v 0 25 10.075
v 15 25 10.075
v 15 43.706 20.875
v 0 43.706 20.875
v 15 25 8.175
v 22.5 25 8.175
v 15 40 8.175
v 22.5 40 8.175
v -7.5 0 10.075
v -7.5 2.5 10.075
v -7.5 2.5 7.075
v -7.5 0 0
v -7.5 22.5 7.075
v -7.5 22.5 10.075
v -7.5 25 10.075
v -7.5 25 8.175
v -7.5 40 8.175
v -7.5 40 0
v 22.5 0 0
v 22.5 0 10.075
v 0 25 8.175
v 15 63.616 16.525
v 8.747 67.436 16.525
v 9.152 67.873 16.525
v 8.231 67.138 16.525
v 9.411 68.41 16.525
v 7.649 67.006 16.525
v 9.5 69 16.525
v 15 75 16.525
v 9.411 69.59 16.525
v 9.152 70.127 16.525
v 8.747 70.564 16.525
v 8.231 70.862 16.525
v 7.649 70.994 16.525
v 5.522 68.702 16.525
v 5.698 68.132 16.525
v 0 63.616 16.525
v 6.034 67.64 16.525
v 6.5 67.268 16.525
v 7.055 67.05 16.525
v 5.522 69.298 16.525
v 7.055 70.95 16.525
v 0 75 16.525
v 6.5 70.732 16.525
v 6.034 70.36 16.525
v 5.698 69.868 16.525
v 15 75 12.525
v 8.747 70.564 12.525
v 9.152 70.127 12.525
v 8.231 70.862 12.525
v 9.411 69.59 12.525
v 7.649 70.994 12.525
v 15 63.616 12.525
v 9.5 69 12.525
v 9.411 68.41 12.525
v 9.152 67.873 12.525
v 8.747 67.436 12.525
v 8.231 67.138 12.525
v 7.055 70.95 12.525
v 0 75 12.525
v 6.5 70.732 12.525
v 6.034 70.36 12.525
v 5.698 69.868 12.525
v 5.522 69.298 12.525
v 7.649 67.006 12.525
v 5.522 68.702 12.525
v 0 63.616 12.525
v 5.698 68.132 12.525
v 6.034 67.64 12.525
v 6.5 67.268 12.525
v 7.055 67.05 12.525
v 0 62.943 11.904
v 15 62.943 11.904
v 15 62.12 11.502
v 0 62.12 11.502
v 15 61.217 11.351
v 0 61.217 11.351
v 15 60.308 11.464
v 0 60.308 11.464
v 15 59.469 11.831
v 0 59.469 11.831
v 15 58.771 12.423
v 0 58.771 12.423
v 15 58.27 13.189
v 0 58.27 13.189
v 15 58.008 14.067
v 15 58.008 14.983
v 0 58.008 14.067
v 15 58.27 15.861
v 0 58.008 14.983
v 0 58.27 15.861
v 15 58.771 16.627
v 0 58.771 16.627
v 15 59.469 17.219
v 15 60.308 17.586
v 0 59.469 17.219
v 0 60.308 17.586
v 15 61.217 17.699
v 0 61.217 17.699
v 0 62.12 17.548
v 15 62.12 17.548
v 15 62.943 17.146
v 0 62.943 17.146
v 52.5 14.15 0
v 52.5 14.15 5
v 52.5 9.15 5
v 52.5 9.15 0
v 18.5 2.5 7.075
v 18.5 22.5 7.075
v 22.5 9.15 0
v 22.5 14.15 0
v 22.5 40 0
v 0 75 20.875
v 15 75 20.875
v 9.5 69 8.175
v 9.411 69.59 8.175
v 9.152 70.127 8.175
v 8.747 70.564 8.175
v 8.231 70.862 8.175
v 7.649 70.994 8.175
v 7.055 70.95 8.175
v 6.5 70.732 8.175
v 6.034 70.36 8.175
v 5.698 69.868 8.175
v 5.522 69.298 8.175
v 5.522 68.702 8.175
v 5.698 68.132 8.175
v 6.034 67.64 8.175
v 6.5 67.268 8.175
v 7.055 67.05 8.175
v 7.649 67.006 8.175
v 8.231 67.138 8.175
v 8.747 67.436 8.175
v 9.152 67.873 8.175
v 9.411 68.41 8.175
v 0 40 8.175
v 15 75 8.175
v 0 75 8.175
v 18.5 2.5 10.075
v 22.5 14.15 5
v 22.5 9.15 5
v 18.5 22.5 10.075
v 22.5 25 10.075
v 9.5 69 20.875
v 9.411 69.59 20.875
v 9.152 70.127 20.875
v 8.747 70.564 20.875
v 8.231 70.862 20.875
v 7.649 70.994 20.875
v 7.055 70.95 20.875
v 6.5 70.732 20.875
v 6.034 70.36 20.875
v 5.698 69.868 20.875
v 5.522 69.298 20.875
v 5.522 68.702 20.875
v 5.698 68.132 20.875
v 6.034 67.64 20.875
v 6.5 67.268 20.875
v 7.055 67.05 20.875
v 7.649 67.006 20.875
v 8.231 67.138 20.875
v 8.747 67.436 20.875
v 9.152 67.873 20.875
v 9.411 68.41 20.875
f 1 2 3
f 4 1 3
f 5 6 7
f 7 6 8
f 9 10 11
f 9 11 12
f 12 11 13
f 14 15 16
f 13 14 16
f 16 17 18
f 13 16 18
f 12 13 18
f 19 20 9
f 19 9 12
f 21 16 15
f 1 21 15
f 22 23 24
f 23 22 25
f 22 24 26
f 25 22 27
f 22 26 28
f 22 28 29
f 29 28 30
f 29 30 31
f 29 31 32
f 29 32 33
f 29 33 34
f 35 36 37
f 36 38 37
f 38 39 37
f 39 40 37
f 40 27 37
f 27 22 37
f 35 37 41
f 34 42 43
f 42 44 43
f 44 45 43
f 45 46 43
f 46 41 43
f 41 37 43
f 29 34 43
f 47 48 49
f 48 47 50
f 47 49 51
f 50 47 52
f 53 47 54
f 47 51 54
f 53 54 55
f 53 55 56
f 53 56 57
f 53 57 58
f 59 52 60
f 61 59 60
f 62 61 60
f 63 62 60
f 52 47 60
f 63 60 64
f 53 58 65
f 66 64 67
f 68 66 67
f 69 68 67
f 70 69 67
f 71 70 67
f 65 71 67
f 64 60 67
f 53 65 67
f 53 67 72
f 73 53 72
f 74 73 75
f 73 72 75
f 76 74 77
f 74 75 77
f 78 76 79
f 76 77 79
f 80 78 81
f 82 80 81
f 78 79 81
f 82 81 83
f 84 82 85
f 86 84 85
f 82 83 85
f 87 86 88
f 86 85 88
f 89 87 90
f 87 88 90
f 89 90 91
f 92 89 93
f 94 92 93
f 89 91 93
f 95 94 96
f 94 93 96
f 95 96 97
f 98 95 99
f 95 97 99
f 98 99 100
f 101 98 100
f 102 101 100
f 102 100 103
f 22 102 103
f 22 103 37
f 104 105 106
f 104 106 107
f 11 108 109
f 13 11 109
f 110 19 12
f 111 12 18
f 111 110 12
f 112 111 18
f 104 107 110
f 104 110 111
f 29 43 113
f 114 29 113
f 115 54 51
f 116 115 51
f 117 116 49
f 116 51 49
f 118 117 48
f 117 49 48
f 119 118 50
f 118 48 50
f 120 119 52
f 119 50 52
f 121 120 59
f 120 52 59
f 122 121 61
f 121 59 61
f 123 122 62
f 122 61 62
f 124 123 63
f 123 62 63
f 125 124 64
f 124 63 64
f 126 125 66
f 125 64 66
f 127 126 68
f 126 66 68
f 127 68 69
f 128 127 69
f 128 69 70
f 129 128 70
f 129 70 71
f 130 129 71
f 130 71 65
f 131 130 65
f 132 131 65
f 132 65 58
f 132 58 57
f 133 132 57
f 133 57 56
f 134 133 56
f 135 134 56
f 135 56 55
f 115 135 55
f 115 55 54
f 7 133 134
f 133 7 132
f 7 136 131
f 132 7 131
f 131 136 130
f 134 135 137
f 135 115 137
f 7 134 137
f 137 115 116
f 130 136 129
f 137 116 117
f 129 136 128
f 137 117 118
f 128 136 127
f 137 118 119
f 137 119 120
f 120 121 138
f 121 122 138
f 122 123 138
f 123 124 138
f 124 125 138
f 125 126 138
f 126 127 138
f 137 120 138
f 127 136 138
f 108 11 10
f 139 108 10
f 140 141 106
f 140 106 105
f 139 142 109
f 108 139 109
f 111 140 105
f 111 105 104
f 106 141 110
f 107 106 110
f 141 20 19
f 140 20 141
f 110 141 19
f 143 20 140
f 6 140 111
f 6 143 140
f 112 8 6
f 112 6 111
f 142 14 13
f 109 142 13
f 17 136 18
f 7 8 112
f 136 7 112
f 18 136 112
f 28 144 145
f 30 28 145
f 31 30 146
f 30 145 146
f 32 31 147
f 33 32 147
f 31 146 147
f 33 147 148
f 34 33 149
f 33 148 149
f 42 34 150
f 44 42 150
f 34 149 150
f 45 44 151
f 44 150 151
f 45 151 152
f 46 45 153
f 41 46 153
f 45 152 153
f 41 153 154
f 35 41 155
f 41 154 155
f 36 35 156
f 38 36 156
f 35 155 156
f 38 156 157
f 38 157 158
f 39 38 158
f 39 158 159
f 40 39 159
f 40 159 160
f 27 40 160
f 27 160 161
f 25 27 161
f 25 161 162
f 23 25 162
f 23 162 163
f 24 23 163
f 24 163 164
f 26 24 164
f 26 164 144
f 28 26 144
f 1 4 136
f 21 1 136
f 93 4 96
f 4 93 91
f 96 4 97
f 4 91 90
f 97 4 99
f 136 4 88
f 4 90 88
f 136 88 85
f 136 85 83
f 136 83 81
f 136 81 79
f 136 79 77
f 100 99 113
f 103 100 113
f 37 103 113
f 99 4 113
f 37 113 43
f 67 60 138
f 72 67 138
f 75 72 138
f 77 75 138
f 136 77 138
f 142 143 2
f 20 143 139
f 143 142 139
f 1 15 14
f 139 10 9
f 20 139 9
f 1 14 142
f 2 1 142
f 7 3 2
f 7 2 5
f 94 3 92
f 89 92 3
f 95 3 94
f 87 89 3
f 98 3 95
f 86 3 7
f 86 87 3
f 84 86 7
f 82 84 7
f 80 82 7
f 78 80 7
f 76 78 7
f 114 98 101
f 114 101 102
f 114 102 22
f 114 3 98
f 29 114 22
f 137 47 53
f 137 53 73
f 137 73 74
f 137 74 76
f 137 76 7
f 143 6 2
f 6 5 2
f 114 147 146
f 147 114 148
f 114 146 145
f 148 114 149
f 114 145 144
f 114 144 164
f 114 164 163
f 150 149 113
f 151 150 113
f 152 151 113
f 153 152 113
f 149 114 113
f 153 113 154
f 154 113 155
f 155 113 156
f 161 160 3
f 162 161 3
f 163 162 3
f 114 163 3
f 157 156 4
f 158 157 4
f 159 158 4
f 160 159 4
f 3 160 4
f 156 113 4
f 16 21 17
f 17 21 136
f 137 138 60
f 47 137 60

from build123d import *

# Parameters (mm, degrees)
BOSS_EXTRUDE1_DEPTH      = 15
CUT_EXTRUDE4_DEPTH       = 16
SKETCH8_R                = 2
CUT_EXTRUDE5_DEPTH       = 21.875
SKETCH9_W                = 8.175
SKETCH9_H                = 40
BOSS_EXTRUDE2_DEPTH      = 22.5
BOSS_EXTRUDE2_DEPTH_BACK = 7.5
SKETCH11_W               = 1.1
SKETCH11_H               = 20
CUT_EXTRUDE6_DEPTH       = 26
BOSS_EXTRUDE4_DEPTH      = 30
SKETCH13_W               = 1.9
SKETCH13_H               = 25
BOSS_EXTRUDE5_DEPTH      = 4
SKETCH15_W               = 5
SKETCH15_H               = 5
BOSS_EXTRUDE6_DEPTH      = 30
CUT_EXTRUDE7_DEPTH       = 23.5


with BuildPart() as part:
    # Sketch2 → Boss-Extrude1 (new body)
    with BuildSketch(Plane(origin=(0, 0, 0), x_dir=(0, 0, -1), z_dir=(1, 0, 0))):
        Polygon((0, 0), (0, 40), (-8.175, 40), (-8.175, 75), (-20.875, 75), (-20.875, 25), (-8.175, 25), (-8.175, 0), align=None)
    extrude(amount=BOSS_EXTRUDE1_DEPTH)

    # Sketch7 → Cut-Extrude4 (cut, through all)
    with BuildSketch(Plane.ZY):
        with BuildLine():
            Line((12.525, 75), (12.525, 63.615892333))
            ThreePointArc((12.525, 63.615892333), (14.525, 57.975), (16.525, 63.615892333))
            Line((16.525, 63.615892333), (16.525, 75))
            Line((16.525, 75), (12.525, 75))
        make_face()
    extrude(amount=-CUT_EXTRUDE4_DEPTH, mode=Mode.SUBTRACT)

    # Sketch8 → Cut-Extrude5 (cut, through all)
    with BuildSketch(Plane.XY.offset(20.875)):
        with Locations((7.5, 69)):
            Circle(SKETCH8_R)
    extrude(amount=-CUT_EXTRUDE5_DEPTH, mode=Mode.SUBTRACT)

    # Sketch9 → Boss-Extrude2 (add, two sides)
    with BuildSketch(Plane(origin=(0, 0, 0), x_dir=(0, 0, -1), z_dir=(1, 0, 0))) as boss_extrude2_sk:
        with Locations((-4.0875, 20)):
            Rectangle(SKETCH9_W, SKETCH9_H)
    extrude(amount=BOSS_EXTRUDE2_DEPTH)
    extrude(boss_extrude2_sk.sketch, amount=-BOSS_EXTRUDE2_DEPTH_BACK)

    # Sketch11 → Cut-Extrude6 (cut)
    with BuildSketch(Plane.ZY.offset(7.5)):
        with Locations((7.625, 12.5)):
            Rectangle(SKETCH11_W, SKETCH11_H)
    extrude(amount=-CUT_EXTRUDE6_DEPTH, mode=Mode.SUBTRACT)

    # Sketch12 → Boss-Extrude4 (add, through all)
    with BuildSketch(Plane.ZY.offset(7.5)):
        Polygon((10.075, 22.5), (7.075, 22.5), (7.075, 2.5), (10.075, 2.5), (10.075, 0), (5.075, 0), (5.075, 25), (10.075, 25), align=None)
    extrude(amount=-BOSS_EXTRUDE4_DEPTH)

    # Sketch13 → Boss-Extrude5 (add)
    with BuildSketch(Plane(origin=(22.5, 0, 0), x_dir=(0, 0, -1), z_dir=(1, 0, 0))):
        with Locations((-9.125, 12.5)):
            Rectangle(SKETCH13_W, SKETCH13_H)
    extrude(amount=-BOSS_EXTRUDE5_DEPTH)

    # Sketch15 → Boss-Extrude6 (add)
    with BuildSketch(Plane(origin=(22.5, 0, 0), x_dir=(0, 0, -1), z_dir=(1, 0, 0))):
        with Locations((-2.5, 11.65)):
            Rectangle(SKETCH15_W, SKETCH15_H)
    extrude(amount=BOSS_EXTRUDE6_DEPTH)

    # Sketch16 → Cut-Extrude7 (cut, through all)
    with BuildSketch(Plane(origin=(15, 0, 0), x_dir=(0, 0, -1), z_dir=(1, 0, 0))):
        Polygon((-10.075, 25), (-20.875, 43.706148722), (-20.875, 25), align=None)
    extrude(amount=-CUT_EXTRUDE7_DEPTH, mode=Mode.SUBTRACT)


solid = part.part
